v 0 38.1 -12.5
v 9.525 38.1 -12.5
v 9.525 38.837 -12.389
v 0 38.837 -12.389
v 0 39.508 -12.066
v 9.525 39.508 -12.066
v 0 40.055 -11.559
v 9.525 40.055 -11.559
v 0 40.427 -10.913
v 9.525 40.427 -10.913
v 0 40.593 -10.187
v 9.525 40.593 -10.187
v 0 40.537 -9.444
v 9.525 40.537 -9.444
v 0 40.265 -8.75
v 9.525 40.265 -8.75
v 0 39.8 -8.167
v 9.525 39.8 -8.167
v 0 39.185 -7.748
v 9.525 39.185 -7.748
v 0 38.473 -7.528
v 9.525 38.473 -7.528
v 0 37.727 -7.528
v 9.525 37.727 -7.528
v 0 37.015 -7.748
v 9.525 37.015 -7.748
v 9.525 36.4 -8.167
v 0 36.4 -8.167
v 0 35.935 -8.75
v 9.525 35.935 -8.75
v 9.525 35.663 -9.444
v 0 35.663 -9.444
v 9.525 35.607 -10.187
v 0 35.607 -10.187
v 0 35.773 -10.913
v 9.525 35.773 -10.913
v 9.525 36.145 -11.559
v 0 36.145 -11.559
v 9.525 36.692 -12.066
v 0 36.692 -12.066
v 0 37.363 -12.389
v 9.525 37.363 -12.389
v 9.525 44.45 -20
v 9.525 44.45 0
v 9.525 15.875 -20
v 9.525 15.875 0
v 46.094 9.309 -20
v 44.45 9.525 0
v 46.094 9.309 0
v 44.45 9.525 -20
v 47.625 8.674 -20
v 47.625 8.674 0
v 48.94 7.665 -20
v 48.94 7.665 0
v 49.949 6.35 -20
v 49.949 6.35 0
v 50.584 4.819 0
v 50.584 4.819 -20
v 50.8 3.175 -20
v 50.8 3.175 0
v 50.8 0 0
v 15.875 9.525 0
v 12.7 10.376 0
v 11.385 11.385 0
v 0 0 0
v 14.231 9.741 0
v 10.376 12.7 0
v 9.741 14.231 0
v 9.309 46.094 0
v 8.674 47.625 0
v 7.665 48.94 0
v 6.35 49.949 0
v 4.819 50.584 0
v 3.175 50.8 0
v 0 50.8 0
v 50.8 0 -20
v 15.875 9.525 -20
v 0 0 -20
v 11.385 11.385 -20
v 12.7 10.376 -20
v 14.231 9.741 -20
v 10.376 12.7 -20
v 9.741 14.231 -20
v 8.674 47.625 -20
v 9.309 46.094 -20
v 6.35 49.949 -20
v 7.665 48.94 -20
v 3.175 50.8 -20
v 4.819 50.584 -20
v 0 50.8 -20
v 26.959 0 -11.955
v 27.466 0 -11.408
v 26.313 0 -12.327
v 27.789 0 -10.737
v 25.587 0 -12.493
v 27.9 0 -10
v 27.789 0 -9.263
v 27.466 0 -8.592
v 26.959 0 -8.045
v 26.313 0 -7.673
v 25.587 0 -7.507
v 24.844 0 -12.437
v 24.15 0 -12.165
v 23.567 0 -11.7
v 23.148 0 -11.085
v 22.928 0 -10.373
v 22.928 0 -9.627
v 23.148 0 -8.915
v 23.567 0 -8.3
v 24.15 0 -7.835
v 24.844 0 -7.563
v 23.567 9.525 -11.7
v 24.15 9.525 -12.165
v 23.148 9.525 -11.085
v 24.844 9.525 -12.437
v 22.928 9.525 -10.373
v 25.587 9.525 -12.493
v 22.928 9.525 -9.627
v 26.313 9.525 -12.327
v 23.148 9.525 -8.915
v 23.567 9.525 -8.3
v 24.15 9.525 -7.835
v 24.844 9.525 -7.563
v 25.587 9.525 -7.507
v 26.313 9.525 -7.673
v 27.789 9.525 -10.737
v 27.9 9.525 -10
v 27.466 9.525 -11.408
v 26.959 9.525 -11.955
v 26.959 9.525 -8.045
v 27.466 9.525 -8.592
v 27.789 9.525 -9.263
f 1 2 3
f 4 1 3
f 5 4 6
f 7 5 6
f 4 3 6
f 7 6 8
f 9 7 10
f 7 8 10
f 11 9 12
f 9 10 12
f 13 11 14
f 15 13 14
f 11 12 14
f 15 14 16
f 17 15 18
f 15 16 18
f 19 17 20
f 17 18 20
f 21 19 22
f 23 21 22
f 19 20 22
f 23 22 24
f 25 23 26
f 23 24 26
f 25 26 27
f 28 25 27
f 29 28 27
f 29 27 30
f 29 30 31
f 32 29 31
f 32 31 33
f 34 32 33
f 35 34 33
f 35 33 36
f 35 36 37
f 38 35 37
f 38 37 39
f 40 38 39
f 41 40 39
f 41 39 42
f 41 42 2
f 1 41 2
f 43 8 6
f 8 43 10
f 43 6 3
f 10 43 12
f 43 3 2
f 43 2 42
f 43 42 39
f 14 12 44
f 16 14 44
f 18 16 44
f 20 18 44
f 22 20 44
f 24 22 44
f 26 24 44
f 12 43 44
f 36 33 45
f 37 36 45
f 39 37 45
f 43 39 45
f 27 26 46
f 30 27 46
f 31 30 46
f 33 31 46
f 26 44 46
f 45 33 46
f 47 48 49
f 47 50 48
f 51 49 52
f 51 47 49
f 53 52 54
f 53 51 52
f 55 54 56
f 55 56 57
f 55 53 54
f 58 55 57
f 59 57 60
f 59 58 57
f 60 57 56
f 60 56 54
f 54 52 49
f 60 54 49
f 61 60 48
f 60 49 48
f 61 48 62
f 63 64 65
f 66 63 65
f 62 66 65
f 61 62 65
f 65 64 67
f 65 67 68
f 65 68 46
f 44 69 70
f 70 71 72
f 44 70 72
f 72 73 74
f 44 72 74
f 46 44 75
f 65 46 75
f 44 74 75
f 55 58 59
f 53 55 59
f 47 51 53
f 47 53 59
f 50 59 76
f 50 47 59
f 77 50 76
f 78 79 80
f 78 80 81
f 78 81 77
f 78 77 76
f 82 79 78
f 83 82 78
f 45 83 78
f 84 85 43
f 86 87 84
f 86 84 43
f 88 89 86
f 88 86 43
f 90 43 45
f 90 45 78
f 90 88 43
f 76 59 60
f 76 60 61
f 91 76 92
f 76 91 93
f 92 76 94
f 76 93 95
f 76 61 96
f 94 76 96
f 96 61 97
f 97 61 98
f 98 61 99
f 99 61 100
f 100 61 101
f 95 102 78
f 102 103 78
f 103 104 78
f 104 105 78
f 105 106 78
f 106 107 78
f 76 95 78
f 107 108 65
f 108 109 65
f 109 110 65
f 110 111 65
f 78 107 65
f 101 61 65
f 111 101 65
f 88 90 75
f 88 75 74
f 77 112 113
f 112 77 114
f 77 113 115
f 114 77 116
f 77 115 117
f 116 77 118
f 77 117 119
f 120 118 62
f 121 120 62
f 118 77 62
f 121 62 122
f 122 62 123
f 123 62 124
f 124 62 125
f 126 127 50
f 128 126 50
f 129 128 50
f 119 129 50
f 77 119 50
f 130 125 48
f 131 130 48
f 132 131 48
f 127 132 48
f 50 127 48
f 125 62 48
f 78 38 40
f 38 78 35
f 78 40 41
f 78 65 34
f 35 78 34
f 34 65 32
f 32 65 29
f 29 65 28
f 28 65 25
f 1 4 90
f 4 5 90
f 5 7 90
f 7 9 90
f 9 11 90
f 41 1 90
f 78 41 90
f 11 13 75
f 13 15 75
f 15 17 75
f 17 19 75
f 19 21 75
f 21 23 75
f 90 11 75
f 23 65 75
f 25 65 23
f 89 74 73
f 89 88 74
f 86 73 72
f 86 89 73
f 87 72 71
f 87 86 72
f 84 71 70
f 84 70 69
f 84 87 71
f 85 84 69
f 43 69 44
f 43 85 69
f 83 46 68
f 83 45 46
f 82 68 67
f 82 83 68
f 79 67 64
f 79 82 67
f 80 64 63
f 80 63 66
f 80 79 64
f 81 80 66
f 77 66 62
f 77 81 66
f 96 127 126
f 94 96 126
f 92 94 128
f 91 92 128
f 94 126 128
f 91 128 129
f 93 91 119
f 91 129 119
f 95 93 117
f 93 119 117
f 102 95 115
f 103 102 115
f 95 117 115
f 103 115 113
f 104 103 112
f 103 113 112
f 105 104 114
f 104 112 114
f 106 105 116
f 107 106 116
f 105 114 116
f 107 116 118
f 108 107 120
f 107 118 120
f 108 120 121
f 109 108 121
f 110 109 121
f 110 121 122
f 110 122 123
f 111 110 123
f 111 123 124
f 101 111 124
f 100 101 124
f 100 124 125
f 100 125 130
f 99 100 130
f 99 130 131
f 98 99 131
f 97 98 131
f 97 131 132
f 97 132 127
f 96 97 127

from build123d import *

# Parameters (mm, degrees)
BOSS_EXTRUDE1_DEPTH   = 20
FILLET1_R             = 6.35
F_5_0MM_DOWEL_HOLE1_D = 5
F_5_0MM_DOWEL_HOLE2_D = 5


with BuildPart() as part:
    # Sketch1 → Boss-Extrude1 (new body)
    with BuildSketch(Plane.XY):
        Polygon((0, 0), (0, 50.8), (9.525, 50.8), (9.525, 9.525), (50.8, 9.525), (50.8, 0), align=None)
    extrude(amount=-BOSS_EXTRUDE1_DEPTH)

    # Fillet1
    fillet1_edges = [part.edges().sort_by_distance(p)[0] for p in [
        (9.525, 50.8, -10),
        (9.525, 9.525, -10),
        (50.8, 9.525, -10),
    ]]
    fillet(fillet1_edges, radius=FILLET1_R)

    # Ø5.0mm Dowel Hole1 (through all)
    with Locations(Plane(origin=(0, 0, 0), x_dir=(-1, 0, 0), z_dir=(0, -1, 0))):
        with Locations((-25.4, 10)):
            Hole(F_5_0MM_DOWEL_HOLE1_D / 2)

    # Ø5.0mm Dowel Hole2 (through all)
    with Locations(Plane.ZY):
        with Locations((-10, 38.1)):
            Hole(F_5_0MM_DOWEL_HOLE2_D / 2)


solid = part.part
